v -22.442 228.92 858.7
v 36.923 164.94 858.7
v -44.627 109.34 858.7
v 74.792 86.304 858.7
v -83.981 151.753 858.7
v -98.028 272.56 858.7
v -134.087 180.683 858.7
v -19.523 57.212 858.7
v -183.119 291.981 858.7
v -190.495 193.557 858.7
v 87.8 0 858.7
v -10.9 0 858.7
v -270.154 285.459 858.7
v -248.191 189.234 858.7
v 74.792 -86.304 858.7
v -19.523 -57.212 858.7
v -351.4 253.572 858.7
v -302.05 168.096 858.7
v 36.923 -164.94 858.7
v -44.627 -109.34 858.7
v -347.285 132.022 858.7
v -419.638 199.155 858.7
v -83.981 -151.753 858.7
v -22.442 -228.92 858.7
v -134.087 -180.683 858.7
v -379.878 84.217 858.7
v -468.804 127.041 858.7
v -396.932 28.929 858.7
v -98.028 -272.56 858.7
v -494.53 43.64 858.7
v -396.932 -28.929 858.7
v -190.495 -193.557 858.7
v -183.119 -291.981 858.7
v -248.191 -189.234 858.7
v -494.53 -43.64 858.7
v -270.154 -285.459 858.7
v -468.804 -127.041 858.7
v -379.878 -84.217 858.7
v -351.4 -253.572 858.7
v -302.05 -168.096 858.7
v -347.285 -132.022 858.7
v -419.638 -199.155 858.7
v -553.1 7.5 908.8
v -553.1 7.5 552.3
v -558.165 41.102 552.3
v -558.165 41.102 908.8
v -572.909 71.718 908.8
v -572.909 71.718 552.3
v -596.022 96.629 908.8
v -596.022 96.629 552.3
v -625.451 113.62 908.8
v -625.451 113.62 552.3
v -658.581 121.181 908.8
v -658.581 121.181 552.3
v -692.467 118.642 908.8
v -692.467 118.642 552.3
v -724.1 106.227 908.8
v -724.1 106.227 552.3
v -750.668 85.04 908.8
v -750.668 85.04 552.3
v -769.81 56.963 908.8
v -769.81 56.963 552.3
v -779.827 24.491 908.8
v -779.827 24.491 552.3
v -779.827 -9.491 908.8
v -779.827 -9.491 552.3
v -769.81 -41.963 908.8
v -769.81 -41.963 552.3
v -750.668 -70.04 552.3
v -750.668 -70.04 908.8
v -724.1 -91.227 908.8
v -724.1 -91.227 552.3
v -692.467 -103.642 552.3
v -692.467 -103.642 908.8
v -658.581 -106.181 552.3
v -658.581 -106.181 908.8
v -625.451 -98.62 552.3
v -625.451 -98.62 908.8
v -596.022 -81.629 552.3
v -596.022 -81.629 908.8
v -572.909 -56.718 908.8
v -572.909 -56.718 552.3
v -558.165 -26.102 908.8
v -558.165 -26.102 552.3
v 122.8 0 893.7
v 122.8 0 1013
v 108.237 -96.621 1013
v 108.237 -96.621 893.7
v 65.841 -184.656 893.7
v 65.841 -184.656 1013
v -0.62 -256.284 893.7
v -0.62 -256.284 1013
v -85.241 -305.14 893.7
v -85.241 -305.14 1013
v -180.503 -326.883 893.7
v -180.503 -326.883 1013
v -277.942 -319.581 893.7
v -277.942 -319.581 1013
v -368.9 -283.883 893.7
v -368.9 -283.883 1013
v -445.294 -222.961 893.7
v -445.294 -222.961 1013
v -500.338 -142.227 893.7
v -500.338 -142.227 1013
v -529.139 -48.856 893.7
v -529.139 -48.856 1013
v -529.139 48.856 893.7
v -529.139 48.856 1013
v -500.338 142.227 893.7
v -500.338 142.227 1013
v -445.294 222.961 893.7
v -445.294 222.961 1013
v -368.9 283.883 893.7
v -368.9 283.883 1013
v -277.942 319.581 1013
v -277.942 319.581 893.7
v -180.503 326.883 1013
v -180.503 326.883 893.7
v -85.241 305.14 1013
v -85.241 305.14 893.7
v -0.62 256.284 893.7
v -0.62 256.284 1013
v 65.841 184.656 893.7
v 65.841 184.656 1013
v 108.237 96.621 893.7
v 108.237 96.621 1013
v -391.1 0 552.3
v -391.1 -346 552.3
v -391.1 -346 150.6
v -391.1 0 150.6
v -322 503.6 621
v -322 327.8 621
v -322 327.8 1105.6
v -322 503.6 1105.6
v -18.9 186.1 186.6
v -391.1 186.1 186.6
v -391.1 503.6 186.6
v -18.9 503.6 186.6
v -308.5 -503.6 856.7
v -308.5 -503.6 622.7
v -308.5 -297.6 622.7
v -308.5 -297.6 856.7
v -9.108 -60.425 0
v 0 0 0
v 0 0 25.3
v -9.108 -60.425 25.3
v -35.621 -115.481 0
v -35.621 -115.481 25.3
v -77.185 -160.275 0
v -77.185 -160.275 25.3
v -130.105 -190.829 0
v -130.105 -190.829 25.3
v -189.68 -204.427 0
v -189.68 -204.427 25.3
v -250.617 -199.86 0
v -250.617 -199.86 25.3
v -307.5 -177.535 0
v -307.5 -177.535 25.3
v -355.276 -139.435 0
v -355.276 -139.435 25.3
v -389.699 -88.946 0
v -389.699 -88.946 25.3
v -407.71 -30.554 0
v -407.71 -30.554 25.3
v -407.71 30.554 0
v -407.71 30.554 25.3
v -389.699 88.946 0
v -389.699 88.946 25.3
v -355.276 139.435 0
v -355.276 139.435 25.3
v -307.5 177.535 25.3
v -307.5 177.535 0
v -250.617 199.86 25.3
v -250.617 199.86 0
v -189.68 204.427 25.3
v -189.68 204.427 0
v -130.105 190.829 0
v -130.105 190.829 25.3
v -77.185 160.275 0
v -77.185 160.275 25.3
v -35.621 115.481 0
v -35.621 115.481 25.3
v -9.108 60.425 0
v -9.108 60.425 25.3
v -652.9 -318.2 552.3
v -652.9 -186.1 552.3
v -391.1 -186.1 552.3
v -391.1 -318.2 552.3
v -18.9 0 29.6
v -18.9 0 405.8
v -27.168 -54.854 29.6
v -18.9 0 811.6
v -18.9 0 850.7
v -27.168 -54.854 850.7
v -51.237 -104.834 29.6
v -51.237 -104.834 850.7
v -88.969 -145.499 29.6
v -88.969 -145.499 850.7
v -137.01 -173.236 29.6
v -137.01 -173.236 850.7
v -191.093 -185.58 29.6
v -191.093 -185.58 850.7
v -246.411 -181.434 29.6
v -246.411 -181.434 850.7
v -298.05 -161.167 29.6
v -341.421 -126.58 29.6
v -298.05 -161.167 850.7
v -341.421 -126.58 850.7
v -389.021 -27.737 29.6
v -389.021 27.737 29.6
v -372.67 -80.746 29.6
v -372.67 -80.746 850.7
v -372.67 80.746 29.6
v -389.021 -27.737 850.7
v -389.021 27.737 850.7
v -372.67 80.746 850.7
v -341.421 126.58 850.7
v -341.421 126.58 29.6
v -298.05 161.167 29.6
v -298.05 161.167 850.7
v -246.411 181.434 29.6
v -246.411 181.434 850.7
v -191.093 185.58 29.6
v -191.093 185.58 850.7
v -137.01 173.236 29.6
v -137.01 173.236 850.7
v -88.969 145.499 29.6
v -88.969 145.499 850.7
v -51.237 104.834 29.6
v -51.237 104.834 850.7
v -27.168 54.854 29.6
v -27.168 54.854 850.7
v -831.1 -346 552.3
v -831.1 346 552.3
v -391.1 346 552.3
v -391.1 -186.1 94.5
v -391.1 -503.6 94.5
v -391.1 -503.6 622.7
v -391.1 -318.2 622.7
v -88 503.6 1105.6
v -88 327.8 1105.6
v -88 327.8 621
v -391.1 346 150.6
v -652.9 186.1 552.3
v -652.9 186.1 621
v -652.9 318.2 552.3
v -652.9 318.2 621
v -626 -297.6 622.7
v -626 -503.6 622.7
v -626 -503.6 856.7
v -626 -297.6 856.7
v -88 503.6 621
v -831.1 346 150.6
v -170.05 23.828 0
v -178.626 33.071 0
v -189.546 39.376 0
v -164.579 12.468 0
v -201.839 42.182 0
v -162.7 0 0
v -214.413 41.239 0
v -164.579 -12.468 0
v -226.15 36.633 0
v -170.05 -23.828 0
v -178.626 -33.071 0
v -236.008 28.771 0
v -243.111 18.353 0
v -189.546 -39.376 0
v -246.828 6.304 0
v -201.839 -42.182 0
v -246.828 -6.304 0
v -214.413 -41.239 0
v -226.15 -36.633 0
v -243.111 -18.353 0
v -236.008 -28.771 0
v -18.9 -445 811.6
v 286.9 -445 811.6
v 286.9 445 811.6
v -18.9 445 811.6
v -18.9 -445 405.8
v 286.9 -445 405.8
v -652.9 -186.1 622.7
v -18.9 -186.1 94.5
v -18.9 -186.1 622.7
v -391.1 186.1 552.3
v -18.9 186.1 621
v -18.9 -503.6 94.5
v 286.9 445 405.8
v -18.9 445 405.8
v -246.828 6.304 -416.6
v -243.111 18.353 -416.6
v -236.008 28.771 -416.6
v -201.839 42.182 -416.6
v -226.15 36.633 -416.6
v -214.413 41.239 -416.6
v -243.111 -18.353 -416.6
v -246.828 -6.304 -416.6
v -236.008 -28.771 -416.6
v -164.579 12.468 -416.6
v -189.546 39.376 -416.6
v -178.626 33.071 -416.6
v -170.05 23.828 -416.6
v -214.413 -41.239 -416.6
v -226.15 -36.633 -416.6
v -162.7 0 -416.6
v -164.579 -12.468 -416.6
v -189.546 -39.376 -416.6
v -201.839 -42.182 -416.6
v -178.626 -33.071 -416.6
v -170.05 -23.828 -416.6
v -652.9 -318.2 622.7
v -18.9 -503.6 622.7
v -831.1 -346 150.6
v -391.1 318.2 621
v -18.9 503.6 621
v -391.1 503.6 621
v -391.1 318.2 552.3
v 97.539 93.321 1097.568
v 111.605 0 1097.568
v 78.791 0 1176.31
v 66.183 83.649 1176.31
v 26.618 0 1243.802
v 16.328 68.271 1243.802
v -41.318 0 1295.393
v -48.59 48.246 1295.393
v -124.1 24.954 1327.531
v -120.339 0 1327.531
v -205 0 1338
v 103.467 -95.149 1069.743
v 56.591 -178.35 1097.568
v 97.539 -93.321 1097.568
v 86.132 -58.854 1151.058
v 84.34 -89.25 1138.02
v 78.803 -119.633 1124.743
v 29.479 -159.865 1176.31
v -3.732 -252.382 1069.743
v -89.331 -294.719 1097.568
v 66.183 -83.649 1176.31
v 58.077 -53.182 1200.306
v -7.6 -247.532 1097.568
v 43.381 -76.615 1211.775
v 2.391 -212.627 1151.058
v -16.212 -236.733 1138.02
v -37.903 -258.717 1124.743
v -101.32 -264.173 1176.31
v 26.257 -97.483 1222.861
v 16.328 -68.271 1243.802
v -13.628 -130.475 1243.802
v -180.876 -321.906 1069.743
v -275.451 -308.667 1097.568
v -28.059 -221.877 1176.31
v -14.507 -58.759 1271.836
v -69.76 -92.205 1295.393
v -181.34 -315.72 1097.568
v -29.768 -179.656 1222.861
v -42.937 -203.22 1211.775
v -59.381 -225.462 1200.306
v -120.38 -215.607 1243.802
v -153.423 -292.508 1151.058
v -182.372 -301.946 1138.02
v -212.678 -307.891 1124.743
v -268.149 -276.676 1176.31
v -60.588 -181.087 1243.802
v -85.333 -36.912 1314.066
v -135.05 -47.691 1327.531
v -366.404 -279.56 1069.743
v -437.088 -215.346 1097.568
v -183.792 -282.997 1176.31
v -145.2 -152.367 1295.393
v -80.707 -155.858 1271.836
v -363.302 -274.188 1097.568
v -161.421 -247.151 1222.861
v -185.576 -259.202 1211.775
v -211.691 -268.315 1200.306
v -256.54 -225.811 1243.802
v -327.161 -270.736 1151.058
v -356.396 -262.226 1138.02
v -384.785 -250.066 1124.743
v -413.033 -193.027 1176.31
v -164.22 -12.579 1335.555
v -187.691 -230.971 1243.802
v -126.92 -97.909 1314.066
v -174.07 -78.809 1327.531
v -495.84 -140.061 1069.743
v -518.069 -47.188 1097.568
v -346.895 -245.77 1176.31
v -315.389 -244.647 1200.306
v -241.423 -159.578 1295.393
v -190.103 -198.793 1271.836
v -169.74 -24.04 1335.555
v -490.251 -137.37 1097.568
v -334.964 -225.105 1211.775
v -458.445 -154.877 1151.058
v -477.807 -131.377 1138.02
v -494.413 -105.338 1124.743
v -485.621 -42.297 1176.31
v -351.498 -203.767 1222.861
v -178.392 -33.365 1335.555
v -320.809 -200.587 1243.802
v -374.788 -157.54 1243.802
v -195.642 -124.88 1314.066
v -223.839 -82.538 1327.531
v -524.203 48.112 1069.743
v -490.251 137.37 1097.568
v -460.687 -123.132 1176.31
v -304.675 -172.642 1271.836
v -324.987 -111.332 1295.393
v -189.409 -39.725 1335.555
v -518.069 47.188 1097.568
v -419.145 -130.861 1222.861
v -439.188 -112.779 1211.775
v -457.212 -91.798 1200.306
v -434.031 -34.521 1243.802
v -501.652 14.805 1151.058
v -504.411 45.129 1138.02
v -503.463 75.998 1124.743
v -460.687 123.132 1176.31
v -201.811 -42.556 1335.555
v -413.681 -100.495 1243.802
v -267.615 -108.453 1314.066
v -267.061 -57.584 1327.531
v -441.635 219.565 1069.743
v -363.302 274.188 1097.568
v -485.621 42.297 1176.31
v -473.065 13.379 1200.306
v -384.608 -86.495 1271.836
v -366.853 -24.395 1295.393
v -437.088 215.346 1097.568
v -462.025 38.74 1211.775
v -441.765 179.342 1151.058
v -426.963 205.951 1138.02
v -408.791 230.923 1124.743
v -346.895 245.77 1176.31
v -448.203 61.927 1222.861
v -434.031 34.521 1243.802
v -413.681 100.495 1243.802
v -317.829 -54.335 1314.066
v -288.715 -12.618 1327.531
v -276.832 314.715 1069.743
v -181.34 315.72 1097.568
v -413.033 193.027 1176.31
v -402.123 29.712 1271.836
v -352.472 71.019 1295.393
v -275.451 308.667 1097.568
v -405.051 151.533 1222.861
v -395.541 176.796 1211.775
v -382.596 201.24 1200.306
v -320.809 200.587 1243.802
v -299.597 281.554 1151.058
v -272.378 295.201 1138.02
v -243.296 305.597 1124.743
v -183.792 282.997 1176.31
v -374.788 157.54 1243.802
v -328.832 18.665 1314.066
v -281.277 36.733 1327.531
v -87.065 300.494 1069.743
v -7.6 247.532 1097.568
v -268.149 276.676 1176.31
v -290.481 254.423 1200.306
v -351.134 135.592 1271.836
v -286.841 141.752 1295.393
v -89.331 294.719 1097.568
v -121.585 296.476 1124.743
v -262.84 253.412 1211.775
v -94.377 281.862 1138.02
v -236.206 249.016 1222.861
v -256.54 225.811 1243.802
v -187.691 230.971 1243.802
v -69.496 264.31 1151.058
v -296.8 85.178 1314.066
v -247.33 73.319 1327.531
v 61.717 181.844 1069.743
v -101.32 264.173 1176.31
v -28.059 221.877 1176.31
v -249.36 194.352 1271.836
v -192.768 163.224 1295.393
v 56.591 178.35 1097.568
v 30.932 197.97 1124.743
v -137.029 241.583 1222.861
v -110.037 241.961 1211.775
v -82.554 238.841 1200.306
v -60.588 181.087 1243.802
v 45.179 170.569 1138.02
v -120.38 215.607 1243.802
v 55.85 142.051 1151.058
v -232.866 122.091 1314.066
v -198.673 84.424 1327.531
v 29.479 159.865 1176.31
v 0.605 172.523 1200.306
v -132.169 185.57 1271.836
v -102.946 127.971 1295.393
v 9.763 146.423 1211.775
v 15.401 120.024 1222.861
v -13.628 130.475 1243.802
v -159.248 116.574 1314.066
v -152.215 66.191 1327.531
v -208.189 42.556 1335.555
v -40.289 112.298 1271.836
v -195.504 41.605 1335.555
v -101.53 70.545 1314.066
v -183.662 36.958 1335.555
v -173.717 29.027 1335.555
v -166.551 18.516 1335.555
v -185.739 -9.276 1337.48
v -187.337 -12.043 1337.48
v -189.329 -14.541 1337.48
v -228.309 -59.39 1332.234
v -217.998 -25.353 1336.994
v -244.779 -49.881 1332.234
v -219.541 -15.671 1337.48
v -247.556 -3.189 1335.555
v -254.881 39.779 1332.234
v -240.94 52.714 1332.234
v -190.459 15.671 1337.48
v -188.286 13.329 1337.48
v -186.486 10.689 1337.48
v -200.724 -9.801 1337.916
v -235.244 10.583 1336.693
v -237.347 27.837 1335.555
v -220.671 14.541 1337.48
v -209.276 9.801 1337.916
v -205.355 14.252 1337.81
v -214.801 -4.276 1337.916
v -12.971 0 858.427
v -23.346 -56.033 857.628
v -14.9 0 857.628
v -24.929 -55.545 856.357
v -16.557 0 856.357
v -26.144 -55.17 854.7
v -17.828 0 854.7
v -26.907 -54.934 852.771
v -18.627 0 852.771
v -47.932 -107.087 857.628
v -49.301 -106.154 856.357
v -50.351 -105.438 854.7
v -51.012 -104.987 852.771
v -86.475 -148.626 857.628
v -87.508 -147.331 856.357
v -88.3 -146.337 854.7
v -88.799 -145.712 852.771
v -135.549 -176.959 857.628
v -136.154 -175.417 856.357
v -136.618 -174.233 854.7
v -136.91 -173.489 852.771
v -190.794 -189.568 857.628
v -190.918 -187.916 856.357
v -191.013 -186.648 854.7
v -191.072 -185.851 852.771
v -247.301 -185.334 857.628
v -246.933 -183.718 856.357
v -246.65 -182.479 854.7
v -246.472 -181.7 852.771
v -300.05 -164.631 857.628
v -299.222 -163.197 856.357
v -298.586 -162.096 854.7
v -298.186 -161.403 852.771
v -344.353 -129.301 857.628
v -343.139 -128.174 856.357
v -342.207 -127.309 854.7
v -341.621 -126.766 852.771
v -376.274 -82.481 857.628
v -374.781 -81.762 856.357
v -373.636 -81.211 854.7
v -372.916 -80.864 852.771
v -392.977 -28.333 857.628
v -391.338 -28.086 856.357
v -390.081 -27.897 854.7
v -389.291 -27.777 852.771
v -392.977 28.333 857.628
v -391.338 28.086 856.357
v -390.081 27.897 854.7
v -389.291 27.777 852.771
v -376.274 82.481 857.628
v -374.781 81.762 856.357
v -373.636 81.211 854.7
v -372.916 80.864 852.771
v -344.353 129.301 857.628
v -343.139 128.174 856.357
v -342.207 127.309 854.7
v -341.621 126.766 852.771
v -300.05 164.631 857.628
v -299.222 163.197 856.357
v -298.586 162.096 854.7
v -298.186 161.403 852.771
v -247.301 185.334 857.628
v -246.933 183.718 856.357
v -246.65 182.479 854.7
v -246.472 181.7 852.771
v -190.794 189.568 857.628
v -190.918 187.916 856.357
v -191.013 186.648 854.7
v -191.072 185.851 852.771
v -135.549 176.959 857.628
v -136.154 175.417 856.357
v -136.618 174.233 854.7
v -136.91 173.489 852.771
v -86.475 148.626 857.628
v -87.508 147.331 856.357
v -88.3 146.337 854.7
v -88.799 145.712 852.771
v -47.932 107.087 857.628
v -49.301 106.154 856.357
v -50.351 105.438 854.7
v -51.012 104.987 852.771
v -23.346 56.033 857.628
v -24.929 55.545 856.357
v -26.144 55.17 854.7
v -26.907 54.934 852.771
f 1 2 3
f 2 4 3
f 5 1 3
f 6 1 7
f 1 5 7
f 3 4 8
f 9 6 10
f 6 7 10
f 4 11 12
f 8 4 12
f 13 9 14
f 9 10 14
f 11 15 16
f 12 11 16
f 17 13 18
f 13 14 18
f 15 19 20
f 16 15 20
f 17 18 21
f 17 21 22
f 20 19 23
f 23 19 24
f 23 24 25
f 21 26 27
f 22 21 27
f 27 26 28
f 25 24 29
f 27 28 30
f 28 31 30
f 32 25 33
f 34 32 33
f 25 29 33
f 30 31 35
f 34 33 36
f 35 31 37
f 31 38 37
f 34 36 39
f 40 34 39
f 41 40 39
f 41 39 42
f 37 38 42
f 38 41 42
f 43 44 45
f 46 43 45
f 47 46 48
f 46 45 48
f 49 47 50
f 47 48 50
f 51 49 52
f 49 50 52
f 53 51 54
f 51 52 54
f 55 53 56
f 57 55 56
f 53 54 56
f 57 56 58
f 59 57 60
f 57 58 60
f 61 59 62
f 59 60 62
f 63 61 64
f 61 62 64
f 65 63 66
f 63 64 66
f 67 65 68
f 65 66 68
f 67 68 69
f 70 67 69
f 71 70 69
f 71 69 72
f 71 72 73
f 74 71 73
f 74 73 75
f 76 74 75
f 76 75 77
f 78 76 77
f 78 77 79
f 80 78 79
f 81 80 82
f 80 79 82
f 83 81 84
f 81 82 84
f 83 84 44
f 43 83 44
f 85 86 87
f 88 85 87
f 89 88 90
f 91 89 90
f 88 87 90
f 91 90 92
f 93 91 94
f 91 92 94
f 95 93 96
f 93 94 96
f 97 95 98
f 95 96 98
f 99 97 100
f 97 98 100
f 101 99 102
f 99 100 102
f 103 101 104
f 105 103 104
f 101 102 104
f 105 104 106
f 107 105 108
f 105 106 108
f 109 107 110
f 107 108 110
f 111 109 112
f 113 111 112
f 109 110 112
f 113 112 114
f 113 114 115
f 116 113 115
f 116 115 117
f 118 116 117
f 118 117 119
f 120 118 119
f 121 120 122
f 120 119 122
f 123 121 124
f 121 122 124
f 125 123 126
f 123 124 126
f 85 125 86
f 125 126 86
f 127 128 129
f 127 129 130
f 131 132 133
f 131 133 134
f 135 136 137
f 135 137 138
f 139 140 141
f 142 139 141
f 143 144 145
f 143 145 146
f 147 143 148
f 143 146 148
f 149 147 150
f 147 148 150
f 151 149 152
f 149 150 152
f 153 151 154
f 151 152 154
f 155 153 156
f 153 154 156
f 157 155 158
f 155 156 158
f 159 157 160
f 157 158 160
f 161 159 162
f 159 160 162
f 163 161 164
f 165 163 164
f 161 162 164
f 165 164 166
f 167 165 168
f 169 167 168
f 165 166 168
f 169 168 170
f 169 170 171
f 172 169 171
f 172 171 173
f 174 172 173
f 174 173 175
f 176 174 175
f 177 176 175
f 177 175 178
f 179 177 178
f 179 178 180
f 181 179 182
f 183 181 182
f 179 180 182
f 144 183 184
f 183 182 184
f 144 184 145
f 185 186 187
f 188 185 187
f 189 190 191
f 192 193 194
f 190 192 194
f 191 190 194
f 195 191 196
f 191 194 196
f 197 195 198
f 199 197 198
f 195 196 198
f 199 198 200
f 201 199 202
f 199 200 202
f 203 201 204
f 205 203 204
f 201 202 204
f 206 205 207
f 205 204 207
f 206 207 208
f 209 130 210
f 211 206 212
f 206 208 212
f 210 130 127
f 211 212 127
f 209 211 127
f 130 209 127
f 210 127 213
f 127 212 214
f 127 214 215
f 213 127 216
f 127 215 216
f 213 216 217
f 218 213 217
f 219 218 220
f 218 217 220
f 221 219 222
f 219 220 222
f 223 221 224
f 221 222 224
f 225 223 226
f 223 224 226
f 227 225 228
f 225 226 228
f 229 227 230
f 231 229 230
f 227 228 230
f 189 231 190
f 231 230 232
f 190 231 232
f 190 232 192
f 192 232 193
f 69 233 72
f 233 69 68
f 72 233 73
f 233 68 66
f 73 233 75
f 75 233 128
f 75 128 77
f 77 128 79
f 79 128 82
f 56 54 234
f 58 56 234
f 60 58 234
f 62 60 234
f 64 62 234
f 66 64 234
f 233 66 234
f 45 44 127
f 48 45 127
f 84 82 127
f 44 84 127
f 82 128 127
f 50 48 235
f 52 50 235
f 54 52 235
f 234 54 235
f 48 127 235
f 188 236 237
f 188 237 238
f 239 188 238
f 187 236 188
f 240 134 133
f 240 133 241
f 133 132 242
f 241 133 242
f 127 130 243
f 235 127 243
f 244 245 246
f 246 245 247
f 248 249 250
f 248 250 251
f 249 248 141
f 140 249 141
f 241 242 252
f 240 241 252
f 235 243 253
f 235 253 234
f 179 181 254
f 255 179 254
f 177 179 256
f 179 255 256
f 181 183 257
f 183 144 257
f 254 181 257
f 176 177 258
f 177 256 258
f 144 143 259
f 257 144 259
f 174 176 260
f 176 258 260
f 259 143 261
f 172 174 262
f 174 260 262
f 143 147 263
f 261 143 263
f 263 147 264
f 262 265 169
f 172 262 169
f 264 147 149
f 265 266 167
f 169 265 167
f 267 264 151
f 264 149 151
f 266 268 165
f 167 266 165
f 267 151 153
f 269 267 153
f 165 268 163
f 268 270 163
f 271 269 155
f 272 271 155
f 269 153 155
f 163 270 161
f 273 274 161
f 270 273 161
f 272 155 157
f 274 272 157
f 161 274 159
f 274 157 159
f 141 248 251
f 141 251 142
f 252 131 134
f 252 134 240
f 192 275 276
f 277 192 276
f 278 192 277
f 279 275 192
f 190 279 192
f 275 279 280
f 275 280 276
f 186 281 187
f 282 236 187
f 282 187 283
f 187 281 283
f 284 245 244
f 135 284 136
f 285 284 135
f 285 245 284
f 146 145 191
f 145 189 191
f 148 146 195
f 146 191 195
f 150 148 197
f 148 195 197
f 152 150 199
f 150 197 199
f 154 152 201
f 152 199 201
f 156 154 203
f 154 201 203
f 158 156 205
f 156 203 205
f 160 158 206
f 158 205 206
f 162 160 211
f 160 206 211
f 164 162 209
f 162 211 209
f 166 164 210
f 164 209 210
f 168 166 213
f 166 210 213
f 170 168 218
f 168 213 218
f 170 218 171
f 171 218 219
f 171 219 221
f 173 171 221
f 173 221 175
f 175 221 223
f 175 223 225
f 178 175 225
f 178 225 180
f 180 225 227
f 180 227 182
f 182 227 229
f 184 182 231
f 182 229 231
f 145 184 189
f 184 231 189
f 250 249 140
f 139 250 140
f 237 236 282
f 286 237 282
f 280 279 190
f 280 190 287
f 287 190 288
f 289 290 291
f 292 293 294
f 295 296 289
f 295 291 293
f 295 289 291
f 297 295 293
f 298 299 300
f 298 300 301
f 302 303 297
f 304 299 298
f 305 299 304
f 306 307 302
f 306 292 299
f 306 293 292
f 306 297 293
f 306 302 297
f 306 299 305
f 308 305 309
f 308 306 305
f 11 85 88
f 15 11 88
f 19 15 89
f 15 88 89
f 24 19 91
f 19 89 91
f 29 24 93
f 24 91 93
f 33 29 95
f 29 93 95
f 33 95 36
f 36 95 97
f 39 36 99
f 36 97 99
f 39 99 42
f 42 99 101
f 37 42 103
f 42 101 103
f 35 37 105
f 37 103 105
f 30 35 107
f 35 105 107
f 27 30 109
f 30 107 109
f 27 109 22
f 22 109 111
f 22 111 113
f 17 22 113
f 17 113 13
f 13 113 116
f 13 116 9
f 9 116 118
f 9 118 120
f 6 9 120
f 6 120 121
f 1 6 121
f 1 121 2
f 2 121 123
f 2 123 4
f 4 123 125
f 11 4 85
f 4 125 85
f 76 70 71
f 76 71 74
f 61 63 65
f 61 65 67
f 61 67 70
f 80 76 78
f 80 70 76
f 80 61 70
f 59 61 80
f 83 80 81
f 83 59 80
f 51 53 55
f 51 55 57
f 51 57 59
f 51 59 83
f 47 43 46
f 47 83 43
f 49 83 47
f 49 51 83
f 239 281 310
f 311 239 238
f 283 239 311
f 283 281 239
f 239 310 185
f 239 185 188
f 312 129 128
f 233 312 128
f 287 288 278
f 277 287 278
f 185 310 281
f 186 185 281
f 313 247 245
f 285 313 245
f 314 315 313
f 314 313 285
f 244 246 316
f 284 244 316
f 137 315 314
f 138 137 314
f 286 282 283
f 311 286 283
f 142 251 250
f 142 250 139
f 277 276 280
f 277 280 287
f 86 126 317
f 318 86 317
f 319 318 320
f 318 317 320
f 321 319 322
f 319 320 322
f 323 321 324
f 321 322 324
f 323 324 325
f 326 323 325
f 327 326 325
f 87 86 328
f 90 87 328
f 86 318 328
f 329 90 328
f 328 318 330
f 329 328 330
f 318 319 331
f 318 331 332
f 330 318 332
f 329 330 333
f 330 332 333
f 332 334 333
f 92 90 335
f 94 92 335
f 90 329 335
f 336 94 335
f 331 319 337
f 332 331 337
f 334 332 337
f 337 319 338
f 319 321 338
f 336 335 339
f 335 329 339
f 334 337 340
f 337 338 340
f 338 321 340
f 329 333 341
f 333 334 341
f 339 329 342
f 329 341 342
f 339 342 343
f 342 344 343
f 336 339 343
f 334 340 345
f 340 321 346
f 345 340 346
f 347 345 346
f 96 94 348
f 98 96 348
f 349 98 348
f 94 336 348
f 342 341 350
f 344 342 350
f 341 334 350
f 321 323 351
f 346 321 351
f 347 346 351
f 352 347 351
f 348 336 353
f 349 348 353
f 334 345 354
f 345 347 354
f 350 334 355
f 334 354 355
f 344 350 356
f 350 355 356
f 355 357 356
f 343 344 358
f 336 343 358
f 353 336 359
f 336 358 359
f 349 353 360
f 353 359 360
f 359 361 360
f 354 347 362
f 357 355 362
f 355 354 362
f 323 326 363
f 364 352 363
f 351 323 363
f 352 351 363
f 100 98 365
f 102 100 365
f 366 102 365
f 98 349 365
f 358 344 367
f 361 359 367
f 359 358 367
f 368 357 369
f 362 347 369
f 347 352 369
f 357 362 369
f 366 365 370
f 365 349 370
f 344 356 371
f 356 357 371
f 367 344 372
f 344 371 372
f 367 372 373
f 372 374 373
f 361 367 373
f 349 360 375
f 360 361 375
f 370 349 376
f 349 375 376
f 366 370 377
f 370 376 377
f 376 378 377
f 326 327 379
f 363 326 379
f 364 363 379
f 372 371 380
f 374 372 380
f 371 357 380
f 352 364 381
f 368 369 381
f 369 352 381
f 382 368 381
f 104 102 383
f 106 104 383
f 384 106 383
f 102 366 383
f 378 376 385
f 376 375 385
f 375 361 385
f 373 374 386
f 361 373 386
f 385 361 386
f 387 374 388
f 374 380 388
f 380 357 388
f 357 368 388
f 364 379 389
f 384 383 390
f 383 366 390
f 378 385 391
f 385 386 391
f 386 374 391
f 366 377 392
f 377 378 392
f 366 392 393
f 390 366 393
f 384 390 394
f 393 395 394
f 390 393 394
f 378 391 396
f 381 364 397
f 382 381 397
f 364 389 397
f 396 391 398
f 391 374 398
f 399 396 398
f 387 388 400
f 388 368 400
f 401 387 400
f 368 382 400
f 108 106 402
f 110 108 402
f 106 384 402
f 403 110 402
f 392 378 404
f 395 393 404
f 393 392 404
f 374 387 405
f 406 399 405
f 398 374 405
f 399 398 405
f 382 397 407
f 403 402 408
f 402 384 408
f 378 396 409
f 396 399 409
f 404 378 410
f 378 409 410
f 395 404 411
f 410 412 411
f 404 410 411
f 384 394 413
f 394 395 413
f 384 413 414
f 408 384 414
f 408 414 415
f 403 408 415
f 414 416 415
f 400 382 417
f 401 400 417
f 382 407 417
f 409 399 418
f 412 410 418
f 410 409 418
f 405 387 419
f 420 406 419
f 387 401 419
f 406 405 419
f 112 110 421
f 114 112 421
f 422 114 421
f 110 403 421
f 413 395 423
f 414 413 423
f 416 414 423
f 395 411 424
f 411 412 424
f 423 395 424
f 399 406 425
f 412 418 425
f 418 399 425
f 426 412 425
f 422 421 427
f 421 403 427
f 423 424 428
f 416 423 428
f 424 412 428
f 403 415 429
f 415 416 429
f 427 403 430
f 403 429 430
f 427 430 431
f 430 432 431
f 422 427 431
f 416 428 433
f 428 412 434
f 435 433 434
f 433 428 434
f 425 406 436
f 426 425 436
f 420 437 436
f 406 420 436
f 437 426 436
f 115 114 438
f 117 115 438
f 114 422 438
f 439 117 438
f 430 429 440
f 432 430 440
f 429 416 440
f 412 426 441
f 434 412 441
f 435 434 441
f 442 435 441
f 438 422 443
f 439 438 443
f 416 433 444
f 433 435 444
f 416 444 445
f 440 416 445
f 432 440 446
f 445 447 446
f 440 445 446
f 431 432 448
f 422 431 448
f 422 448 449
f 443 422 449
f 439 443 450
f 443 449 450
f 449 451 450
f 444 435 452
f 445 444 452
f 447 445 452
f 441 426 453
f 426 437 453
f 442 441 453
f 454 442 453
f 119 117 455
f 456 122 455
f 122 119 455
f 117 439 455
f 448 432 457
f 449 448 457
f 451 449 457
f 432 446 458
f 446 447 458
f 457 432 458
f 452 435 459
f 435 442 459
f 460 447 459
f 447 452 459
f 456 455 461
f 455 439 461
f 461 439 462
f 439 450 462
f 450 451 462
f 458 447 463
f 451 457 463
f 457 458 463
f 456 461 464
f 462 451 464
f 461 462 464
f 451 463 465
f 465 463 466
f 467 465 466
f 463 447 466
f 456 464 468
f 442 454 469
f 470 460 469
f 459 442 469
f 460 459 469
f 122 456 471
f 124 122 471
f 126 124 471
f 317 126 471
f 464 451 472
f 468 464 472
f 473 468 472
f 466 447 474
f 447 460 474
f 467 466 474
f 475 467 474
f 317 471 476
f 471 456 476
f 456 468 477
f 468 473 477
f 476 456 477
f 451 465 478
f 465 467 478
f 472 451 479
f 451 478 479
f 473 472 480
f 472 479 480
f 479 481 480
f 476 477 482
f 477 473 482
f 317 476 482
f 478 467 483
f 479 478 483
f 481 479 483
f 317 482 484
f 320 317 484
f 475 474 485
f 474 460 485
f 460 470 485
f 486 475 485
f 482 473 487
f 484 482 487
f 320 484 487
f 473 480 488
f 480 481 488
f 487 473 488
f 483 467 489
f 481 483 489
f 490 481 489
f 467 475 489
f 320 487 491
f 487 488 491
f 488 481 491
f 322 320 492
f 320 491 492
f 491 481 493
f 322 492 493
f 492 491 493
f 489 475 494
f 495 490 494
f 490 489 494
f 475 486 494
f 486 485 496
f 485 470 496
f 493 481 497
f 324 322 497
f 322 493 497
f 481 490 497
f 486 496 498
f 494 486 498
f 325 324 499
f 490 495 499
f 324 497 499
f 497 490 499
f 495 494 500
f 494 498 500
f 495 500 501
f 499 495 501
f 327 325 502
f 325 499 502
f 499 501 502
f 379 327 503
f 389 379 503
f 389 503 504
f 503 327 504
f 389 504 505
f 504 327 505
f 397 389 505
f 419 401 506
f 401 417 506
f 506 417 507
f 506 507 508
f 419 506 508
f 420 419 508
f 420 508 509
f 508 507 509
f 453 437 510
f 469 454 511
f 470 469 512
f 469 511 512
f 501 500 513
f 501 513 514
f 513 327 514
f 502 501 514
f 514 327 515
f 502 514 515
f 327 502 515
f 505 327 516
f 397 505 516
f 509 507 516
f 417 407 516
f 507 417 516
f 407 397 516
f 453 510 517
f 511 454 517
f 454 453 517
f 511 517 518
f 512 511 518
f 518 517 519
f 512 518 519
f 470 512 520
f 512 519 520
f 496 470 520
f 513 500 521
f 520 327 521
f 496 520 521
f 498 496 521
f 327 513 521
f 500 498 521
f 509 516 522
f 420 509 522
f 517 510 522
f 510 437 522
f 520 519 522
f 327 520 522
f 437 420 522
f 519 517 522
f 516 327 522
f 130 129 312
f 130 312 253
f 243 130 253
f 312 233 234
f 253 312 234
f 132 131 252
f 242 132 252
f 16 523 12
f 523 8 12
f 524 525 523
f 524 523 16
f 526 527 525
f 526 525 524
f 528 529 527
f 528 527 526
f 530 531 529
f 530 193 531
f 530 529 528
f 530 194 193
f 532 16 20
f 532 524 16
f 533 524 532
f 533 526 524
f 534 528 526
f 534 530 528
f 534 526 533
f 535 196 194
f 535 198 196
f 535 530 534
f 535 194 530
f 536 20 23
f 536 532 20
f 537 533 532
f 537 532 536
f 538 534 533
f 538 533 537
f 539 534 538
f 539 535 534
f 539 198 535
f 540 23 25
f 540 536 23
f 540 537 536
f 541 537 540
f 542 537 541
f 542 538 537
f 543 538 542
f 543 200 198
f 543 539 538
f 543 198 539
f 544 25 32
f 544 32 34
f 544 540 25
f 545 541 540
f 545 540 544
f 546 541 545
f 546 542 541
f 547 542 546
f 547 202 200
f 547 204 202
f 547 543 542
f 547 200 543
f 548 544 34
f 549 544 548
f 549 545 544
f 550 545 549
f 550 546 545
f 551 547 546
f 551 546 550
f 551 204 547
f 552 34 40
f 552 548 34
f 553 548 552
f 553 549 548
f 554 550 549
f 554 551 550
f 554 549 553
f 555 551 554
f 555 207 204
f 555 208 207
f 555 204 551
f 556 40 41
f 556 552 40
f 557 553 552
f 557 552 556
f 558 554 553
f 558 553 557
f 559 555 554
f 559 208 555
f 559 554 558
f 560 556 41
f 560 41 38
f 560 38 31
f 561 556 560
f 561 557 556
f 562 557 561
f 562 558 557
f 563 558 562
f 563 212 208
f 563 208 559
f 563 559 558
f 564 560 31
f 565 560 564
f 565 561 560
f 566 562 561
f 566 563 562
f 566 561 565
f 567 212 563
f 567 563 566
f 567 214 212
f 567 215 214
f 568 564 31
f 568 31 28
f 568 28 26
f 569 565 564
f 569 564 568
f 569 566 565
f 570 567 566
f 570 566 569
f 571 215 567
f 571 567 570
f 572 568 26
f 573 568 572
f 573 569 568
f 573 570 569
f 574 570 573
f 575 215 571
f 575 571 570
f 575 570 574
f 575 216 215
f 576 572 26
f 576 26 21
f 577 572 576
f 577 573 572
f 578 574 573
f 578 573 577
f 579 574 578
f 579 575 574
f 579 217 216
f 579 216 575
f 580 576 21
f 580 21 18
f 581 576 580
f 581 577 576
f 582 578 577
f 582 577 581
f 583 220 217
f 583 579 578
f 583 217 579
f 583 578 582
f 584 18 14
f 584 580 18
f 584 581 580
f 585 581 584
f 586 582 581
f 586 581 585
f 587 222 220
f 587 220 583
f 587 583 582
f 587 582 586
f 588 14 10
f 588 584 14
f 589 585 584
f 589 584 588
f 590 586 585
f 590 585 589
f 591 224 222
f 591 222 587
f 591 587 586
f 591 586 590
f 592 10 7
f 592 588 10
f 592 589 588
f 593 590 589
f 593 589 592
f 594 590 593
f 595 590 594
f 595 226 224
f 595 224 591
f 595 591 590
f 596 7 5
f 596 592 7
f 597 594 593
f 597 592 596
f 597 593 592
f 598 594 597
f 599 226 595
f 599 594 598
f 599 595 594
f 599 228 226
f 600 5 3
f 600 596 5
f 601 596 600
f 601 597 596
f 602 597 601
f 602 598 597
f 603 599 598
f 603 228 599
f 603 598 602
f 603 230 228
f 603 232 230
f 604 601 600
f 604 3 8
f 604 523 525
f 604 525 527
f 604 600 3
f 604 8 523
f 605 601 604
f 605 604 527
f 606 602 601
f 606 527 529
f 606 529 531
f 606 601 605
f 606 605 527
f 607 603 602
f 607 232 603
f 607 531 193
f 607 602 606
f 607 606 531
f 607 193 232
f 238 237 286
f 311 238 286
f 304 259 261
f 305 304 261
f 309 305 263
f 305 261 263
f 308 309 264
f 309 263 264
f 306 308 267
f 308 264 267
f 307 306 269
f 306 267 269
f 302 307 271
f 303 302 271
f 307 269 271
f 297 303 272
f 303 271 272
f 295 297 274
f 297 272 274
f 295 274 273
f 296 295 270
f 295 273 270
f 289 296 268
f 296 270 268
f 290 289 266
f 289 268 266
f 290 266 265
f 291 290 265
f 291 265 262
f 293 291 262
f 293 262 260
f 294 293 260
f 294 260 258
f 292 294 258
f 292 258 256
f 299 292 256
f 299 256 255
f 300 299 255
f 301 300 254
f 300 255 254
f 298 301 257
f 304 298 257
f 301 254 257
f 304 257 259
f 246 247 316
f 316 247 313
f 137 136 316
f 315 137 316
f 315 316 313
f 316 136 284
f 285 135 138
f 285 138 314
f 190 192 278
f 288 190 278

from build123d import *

# Parameters (mm, degrees)
F2_SIZE   = 35
F3_R      = 8
F4_R      = 42.3
F5_DEPTH  = 416.6
F7_W      = 890
F7_H      = 405.8
F8_DEPTH  = 305.8
F10_W     = 692
F10_H     = 401.7
F11_DEPTH = 440
F12_R     = 114
F13_DEPTH = 356.5
F15_W     = 372.2
F15_H     = 528.2
F16_DEPTH = 317.5
F18_W     = 372.2
F18_H     = 434.4
F19_DEPTH = 317.5
F20_W     = 234
F20_H     = 175.8
F21_DEPTH = 484.6
F22_W     = 317.5
F22_H     = 206
F23_DEPTH = 234
F24_W     = 261.8
F24_H     = 132.1
F25_DEPTH = 68.7
F26_W     = 261.8
F26_H     = 132.1
F27_DEPTH = 70.4


with BuildPart() as f1:
    # F0 (on Front) → F1 (revolve)
    with BuildSketch(Plane.XZ):
        with BuildLine():
            Line((-205, 0), (0, 0))
            Line((0, 0), (0, 25.3))
            Line((0, 25.3), (-18.9, 29.6))
            Line((-18.9, 29.6), (-18.9, 858.7))
            Line((-18.9, 858.7), (122.8, 858.7))
            Line((122.8, 858.7), (122.8, 1013))
            ThreePointArc((122.8, 1013), (26.6183567342, 1243.801776423), (-205, 1338))
            Line((-205, 1338), (-205, 0))
        make_face()
    revolve(axis=Axis((-205, 0, 856.7140548392), (0, 0, -1)))

    # F2
    f2_edges = [f1.edges().sort_by_distance(p)[0] for p in [
        (-532.8, 0, 858.7),
    ]]
    chamfer(f2_edges, length=F2_SIZE)

    # F3
    f3_edges = [f1.edges().sort_by_distance(p)[0] for p in [
        (-391.1, 0, 858.7),
    ]]
    fillet(f3_edges, radius=F3_R)

    # F4 (on face) → F5 (join)
    with BuildSketch(Plane(origin=(0, 0, 0), x_dir=(1, 0, 0), z_dir=(0, 0, -1))):
        with Locations((-205, 0)):
            Circle(F4_R)
    extrude(amount=F5_DEPTH)

    # F7 (on offset) → F8 (join)
    with BuildSketch(Plane.YZ.offset(-18.9)):
        with Locations((0, 608.7)):
            Rectangle(F7_W, F7_H)
    extrude(amount=F8_DEPTH)

    # F10 (on offset) → F11 (join)
    with BuildSketch(Plane.YZ.offset(-391.1)):
        with Locations((0, 351.45)):
            Rectangle(F10_W, F10_H)
    extrude(amount=-F11_DEPTH)

    # F12 (on face) → F13 (join)
    with BuildSketch(Plane.XY.offset(552.3)):
        with Locations((-667.1, 7.5)):
            Circle(F12_R)
    extrude(amount=F13_DEPTH)


with BuildPart() as f16:
    # F15 (on offset) → F16 (new body)
    with BuildSketch(Plane.XZ.offset(186.1)):
        with Locations((-205, 358.6)):
            Rectangle(F15_W, F15_H)
    extrude(amount=F16_DEPTH)

    # F26 (on face) → F27 (join, through all)
    with BuildSketch(Plane.XY.offset(622.7)):
        with Locations((-522, -252.15)):
            Rectangle(F26_W, F26_H)
    extrude(amount=-F27_DEPTH)


with BuildPart() as f19:
    # F18 (on offset) → F19 (new body)
    with BuildSketch(Plane.XZ.offset(-186.1)):
        with Locations((-205, 403.8)):
            Rectangle(F18_W, F18_H)
    extrude(amount=-F19_DEPTH)

    # F24 (on face) → F25 (join, through all)
    with BuildSketch(Plane.XY.offset(621)):
        with Locations((-522, 252.15)):
            Rectangle(F24_W, F24_H)
    extrude(amount=-F25_DEPTH)


with BuildPart() as f21:
    # F20 (on face) → F21 (new body)
    with BuildSketch(Plane.XY.offset(621)):
        with Locations((-205, 415.7)):
            Rectangle(F20_W, F20_H)
    extrude(amount=F21_DEPTH)


with BuildPart() as f23:
    # F22 (on face) → F23 (new body)
    with BuildSketch(Plane.XY.offset(622.7)):
        with Locations((-467.25, -400.6)):
            Rectangle(F22_W, F22_H)
    extrude(amount=F23_DEPTH)


solid = Compound([f1.part, f16.part, f19.part, f21.part, f23.part])
